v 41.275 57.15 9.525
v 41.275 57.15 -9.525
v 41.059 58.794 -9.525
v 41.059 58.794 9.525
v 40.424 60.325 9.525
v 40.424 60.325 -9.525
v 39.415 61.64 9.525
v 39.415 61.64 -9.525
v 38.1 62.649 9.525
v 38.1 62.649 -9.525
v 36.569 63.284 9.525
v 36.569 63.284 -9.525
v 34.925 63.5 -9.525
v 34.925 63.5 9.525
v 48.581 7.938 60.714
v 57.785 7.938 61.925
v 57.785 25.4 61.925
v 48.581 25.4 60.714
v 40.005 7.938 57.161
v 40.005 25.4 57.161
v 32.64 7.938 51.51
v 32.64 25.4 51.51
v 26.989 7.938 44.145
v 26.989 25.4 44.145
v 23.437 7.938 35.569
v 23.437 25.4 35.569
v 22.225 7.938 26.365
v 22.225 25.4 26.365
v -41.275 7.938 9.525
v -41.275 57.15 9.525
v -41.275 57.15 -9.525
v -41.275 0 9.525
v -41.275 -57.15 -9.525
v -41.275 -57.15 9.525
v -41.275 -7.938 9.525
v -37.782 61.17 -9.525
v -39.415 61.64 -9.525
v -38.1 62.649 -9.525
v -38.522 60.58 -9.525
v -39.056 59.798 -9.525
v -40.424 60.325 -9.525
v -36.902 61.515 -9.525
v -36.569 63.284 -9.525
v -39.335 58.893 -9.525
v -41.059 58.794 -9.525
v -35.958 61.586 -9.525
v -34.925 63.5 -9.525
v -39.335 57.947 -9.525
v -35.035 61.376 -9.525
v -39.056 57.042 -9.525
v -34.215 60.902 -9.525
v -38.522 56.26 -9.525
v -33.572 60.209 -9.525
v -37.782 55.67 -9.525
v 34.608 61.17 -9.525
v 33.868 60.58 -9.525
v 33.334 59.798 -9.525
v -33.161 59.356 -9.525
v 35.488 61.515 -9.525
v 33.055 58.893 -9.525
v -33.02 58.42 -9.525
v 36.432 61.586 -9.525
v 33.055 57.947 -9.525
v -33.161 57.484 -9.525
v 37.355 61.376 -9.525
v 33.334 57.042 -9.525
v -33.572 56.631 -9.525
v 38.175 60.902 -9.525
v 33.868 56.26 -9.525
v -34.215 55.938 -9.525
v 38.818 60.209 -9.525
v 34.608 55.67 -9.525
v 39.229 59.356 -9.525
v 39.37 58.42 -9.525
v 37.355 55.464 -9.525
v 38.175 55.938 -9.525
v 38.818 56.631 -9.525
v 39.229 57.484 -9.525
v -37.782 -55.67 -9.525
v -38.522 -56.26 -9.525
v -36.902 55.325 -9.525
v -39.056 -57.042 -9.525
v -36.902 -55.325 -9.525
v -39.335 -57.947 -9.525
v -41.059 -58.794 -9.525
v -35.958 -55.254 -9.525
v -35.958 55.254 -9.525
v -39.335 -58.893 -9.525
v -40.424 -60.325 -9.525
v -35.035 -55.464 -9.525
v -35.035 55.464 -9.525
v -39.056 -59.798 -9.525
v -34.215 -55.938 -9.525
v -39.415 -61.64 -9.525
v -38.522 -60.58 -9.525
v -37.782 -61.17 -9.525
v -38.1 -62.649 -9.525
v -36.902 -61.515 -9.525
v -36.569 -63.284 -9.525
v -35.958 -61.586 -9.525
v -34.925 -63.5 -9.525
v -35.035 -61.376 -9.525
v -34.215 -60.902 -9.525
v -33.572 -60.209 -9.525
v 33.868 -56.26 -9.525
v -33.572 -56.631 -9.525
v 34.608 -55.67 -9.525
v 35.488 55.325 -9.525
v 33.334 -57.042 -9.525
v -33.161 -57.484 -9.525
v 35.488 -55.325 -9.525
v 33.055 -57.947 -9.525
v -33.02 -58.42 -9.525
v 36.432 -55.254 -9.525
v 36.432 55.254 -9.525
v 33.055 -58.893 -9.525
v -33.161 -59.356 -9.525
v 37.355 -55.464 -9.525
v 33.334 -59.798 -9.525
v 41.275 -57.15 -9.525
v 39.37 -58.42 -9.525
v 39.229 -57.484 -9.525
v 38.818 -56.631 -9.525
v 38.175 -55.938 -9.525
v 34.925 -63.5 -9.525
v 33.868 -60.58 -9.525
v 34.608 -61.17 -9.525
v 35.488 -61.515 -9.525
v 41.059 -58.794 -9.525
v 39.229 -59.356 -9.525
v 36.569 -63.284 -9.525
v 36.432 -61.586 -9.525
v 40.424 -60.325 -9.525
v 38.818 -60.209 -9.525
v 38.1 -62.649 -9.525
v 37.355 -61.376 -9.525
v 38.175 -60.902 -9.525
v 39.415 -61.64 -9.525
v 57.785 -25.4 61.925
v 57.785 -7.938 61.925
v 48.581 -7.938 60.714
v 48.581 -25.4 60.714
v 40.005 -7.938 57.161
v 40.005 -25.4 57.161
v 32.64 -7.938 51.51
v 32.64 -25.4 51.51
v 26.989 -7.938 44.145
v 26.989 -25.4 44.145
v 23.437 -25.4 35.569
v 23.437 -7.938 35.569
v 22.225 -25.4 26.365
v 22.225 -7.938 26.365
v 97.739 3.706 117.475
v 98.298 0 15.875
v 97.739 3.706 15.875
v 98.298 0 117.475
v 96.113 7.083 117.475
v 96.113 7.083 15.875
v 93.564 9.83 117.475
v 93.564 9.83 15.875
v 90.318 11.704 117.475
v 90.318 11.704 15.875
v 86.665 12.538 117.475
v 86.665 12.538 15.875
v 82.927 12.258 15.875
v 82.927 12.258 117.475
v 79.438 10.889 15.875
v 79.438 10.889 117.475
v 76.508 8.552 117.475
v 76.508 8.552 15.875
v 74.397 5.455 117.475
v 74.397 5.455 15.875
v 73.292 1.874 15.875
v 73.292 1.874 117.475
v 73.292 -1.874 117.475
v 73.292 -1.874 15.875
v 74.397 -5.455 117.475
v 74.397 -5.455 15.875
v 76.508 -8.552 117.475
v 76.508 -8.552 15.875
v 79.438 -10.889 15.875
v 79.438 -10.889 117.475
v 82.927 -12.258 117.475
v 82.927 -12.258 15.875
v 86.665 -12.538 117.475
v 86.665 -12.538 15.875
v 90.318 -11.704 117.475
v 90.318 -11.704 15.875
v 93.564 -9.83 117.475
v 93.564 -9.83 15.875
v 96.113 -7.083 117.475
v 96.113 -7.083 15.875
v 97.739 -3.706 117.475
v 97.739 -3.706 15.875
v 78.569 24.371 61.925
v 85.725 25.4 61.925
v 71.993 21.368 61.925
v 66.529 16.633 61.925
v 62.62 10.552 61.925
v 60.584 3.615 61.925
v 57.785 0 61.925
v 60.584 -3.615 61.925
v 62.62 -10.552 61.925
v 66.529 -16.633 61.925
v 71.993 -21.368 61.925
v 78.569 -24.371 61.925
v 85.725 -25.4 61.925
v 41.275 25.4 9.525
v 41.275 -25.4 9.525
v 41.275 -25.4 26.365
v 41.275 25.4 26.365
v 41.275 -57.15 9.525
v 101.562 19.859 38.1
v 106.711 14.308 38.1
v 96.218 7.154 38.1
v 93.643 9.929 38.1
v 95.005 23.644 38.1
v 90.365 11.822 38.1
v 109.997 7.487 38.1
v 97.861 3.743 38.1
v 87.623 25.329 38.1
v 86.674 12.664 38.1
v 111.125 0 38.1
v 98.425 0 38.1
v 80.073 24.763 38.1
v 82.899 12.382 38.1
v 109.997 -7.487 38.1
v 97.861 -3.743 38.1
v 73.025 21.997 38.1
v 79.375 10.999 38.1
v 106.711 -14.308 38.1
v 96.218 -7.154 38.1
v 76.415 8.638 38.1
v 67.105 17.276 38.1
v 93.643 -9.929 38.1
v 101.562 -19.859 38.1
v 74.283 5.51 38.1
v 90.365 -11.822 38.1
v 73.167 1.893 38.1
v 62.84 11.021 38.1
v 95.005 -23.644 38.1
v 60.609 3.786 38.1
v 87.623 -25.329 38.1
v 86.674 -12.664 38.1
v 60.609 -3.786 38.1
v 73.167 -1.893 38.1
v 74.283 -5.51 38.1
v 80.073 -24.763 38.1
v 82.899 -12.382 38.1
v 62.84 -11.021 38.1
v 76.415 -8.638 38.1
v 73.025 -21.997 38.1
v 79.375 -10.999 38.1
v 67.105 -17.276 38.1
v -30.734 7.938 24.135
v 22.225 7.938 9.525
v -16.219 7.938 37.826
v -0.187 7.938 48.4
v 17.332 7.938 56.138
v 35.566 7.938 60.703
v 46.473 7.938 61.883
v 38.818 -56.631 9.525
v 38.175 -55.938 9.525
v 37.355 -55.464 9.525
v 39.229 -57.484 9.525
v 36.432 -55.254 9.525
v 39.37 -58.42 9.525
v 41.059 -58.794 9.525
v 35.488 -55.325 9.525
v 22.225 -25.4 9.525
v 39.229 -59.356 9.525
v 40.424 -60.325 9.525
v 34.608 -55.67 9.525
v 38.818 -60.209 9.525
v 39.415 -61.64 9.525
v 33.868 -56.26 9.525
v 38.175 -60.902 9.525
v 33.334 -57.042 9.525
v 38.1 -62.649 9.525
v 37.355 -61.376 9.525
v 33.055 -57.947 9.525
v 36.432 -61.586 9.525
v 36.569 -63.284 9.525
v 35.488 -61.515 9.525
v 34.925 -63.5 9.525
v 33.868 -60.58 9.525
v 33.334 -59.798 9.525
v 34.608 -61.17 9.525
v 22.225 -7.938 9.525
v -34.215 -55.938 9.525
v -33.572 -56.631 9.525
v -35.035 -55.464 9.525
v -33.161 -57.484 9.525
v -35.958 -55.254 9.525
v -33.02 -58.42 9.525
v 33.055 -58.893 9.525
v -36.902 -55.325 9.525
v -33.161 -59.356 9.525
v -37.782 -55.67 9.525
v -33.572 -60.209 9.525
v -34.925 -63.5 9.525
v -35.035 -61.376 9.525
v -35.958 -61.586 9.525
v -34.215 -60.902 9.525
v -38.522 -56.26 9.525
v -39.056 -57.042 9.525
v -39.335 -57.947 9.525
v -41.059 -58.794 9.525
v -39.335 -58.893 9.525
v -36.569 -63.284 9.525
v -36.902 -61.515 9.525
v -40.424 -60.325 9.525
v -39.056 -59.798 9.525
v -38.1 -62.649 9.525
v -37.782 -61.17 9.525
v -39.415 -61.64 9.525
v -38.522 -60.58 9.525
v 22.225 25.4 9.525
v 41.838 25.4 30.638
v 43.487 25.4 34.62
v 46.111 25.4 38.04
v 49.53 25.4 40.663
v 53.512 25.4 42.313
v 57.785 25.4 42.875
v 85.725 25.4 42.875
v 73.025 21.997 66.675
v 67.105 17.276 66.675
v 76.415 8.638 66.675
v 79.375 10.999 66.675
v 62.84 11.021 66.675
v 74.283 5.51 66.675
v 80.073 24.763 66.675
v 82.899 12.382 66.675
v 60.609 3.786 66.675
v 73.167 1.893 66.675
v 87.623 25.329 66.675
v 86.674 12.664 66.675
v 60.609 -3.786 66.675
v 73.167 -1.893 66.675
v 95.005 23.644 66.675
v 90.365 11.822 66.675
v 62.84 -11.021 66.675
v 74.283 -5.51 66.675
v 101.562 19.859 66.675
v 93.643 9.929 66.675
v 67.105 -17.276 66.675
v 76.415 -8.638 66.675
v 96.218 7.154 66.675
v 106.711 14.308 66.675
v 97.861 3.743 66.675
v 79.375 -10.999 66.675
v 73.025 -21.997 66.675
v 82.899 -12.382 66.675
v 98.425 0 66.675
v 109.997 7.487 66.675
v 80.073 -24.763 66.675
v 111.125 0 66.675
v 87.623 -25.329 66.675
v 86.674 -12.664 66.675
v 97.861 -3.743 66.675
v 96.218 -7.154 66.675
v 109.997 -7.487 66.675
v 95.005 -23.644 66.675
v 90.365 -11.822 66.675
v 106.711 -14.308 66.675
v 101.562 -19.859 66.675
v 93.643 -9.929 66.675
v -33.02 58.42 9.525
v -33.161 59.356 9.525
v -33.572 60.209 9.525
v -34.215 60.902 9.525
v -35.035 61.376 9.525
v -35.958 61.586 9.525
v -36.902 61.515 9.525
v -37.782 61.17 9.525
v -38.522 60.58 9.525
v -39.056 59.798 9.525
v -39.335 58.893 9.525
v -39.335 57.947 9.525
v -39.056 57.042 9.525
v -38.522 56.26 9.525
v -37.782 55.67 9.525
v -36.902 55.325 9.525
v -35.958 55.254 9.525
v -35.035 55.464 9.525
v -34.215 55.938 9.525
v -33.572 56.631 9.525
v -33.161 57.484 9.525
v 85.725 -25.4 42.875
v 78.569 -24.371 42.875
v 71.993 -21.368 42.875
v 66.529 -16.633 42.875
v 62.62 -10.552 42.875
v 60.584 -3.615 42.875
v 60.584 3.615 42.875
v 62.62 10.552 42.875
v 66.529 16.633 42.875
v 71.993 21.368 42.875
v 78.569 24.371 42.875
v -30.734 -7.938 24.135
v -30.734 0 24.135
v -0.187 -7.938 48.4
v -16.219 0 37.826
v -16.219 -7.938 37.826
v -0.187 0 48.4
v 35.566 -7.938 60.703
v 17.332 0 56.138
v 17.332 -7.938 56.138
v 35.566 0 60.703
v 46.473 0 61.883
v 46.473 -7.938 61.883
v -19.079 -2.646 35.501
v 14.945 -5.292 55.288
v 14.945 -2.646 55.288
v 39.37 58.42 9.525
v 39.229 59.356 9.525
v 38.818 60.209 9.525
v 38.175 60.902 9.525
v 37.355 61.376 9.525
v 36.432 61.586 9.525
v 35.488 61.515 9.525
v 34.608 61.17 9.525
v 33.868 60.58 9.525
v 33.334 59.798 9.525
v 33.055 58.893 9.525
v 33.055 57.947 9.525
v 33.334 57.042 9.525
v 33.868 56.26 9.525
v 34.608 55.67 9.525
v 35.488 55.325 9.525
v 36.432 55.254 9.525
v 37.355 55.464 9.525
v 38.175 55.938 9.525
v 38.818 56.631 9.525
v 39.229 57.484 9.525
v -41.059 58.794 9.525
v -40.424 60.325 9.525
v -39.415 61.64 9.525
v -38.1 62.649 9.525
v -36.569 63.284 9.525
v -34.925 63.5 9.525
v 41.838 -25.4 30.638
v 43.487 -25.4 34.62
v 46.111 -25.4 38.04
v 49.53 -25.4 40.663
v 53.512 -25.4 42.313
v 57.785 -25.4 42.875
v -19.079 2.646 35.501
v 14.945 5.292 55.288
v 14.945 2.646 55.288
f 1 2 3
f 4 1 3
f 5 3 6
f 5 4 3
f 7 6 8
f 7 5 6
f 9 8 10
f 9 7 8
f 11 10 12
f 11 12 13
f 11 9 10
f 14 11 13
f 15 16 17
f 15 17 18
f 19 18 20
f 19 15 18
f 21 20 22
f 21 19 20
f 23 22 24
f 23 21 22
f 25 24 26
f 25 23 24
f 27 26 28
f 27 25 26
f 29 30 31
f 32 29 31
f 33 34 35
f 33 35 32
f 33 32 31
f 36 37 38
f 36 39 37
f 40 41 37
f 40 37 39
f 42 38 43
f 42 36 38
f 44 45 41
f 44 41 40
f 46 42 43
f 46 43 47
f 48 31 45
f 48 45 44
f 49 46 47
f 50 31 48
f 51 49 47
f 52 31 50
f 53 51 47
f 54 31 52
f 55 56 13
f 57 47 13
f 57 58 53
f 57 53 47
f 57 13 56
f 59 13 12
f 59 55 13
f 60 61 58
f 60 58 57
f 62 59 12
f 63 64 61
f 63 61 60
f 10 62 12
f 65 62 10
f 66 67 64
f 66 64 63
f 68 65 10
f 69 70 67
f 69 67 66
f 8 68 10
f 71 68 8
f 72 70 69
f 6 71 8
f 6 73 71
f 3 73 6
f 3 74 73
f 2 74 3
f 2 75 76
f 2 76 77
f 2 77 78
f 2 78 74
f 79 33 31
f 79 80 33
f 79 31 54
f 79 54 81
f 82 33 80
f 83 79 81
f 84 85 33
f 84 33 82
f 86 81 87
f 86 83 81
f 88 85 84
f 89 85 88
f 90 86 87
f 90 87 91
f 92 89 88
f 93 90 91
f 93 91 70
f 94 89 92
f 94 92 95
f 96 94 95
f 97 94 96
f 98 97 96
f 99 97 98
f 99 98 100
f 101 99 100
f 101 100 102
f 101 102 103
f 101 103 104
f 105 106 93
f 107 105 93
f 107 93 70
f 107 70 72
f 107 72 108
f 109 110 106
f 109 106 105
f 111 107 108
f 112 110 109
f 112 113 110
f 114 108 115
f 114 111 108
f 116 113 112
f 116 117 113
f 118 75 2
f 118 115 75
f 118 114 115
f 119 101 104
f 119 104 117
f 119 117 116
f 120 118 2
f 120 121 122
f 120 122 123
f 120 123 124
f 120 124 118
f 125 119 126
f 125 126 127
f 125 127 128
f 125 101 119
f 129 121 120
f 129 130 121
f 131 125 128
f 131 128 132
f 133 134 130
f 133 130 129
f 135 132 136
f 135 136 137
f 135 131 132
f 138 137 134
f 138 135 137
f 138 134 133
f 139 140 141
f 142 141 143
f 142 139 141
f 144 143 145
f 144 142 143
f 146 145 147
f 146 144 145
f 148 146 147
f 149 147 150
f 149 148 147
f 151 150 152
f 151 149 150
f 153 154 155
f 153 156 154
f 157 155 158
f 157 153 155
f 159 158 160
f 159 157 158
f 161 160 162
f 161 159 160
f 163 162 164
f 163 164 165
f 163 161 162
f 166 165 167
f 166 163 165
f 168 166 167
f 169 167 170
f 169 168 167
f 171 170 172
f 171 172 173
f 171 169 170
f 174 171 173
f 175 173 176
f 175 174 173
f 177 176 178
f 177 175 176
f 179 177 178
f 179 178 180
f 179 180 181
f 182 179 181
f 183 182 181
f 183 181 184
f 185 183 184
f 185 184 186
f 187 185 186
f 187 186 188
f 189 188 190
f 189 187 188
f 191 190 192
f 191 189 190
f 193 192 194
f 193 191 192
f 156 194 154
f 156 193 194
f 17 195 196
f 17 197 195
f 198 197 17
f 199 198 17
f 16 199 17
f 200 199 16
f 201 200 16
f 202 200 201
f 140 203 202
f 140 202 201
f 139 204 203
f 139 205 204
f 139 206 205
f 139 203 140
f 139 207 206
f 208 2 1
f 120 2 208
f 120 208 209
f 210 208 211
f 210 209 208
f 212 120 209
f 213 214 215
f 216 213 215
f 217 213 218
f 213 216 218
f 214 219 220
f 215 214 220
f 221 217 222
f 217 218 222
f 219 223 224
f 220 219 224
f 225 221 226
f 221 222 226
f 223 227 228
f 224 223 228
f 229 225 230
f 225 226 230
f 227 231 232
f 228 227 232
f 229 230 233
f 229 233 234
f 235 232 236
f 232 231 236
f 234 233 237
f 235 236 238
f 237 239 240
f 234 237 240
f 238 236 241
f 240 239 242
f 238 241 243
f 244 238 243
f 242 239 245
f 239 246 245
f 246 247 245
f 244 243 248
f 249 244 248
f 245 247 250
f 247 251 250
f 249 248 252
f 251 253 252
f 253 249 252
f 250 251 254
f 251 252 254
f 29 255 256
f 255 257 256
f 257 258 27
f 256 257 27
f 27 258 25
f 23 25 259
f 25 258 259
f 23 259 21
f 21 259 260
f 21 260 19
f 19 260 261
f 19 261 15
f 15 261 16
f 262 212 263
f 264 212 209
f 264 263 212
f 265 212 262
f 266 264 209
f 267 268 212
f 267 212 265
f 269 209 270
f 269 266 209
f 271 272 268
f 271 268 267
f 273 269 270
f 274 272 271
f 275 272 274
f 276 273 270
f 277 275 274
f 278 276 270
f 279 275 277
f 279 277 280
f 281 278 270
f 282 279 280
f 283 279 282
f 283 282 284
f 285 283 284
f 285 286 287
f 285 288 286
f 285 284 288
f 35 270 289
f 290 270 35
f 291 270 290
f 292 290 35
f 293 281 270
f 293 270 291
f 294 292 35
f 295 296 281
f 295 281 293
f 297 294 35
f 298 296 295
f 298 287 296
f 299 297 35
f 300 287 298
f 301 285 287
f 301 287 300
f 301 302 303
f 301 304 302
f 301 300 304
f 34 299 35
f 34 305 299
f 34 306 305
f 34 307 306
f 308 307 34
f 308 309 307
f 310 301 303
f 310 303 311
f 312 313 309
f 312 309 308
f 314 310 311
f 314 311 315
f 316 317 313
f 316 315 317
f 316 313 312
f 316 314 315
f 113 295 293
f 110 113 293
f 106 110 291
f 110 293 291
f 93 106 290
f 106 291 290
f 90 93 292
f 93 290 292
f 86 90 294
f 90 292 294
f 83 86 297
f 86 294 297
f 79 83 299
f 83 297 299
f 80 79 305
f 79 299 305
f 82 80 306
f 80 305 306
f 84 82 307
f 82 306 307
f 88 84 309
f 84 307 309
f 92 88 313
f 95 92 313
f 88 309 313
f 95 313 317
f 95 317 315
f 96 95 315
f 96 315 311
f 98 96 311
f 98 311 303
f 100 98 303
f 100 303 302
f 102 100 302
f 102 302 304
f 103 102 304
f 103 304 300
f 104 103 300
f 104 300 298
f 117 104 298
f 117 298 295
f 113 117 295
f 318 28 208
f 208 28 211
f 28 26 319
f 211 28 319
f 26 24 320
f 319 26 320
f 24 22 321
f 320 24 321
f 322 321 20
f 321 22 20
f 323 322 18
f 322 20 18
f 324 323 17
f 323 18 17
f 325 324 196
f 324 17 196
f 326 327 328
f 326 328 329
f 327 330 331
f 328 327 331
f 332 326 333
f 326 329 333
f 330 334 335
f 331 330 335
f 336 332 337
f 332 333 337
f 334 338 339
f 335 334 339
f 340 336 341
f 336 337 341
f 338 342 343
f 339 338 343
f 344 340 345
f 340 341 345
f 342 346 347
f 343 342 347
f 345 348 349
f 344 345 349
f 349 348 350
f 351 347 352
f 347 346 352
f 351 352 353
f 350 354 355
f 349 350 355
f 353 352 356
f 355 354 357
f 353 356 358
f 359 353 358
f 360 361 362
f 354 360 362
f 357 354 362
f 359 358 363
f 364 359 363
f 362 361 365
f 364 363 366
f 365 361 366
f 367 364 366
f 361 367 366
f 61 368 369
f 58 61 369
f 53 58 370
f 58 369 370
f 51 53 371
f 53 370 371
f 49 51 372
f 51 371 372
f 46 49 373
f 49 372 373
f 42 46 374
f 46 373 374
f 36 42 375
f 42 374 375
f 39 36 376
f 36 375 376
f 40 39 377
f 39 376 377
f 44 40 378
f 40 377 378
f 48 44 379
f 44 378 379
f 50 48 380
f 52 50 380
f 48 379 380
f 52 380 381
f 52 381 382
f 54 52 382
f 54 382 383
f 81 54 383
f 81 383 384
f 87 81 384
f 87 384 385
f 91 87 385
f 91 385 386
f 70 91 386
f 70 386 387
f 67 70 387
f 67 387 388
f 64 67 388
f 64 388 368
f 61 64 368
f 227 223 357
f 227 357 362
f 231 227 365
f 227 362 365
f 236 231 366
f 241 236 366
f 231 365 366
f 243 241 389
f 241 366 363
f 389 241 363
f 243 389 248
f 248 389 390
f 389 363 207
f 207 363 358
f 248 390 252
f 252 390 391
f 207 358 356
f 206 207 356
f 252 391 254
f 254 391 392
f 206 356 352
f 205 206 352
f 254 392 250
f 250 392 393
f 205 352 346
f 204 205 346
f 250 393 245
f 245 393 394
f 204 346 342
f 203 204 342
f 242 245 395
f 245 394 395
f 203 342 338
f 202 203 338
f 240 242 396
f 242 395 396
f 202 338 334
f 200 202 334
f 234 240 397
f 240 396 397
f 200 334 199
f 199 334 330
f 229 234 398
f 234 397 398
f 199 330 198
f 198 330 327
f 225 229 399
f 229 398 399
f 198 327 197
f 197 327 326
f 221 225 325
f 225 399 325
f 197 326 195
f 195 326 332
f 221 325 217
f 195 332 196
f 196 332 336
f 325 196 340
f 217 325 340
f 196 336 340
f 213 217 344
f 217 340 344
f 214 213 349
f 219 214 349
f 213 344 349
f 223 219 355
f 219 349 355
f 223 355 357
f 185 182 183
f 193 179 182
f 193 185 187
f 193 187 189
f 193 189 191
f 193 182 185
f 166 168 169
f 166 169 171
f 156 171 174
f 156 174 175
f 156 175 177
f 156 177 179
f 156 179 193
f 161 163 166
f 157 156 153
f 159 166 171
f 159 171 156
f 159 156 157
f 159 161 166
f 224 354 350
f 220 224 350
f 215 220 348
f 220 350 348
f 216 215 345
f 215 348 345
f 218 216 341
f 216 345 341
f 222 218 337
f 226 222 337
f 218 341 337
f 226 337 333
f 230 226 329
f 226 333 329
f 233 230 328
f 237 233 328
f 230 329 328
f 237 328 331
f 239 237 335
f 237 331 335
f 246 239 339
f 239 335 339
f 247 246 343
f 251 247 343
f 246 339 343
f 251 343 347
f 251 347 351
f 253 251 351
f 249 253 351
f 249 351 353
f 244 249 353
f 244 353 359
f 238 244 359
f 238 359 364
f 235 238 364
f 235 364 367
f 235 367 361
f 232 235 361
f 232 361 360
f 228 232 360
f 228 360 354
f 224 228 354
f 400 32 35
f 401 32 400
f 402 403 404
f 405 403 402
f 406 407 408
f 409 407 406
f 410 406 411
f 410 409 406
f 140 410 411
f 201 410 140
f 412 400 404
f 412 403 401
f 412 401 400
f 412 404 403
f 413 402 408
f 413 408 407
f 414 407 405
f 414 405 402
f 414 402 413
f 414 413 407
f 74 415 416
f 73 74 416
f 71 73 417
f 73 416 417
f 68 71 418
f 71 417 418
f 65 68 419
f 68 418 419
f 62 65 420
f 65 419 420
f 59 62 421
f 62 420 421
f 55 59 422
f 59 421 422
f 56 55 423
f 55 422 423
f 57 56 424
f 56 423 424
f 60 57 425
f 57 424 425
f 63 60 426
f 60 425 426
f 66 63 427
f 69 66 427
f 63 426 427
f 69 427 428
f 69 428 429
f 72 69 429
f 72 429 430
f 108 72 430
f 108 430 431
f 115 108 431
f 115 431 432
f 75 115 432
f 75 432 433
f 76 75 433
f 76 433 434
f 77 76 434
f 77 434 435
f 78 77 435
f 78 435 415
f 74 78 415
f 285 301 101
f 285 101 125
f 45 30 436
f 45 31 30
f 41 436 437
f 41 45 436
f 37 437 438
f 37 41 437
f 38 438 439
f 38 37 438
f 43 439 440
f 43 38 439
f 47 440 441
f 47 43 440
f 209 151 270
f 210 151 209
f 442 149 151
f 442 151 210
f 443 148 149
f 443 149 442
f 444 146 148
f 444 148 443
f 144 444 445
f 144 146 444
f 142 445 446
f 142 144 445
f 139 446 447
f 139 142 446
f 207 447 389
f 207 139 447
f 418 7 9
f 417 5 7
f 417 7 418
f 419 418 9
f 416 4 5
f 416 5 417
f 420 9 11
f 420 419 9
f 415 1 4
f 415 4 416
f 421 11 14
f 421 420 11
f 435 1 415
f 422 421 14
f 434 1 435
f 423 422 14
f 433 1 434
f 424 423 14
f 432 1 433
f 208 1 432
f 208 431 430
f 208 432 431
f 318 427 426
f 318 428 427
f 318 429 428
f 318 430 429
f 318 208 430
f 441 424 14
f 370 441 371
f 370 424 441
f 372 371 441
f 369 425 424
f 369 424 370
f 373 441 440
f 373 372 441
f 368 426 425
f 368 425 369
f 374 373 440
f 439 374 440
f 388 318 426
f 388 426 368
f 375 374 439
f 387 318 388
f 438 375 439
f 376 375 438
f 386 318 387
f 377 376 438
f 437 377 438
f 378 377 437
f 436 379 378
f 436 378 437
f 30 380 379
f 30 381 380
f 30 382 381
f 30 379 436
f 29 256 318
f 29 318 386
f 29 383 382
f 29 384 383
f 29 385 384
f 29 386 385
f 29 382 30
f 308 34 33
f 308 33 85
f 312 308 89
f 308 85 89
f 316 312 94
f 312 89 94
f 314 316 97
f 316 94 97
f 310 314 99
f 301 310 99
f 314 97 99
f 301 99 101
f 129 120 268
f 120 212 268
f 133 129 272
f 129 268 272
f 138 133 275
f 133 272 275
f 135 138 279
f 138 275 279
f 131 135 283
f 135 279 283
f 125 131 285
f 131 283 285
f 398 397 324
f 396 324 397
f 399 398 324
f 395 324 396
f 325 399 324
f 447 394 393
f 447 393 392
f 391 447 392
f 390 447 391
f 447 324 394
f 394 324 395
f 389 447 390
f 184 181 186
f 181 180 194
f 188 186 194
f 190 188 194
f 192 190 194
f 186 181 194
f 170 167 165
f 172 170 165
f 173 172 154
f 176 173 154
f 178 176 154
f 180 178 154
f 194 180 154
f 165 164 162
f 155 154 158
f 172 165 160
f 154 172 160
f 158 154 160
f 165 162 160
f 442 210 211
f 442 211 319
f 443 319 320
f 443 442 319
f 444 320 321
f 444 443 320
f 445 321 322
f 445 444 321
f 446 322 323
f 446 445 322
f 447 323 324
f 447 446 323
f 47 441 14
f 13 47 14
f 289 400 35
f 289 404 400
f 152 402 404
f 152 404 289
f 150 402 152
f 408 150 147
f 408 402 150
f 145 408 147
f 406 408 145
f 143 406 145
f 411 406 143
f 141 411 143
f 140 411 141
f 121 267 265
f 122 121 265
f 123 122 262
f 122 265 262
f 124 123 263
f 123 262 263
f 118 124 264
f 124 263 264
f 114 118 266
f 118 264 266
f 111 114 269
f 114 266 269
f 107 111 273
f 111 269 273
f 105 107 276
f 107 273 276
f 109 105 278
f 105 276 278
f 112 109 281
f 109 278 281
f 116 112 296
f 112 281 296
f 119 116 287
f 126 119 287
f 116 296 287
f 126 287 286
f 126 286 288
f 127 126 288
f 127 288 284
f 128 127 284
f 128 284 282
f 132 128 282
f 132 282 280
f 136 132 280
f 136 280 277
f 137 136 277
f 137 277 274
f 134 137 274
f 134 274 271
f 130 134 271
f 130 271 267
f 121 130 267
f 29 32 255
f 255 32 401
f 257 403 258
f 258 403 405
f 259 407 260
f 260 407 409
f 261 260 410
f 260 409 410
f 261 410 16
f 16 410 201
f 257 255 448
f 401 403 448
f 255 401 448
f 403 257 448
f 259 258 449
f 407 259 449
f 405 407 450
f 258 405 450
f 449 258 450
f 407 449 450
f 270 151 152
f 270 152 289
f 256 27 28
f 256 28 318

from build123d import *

# Parameters (mm, degrees)
F1_DEPTH  = 63.5
F0_W      = 25.4
F0_H      = 19.05
F2_DEPTH  = 25.4
F3_DEPTH  = 7.9375
F5_R      = 6.35
F6_R      = 12.7
F7_DEPTH  = 30.48
F8_R      = 3.175
F9_DEPTH  = 25.4
F10_R     = 12.573
F11_DEPTH = 50.8


with BuildPart() as f1:
    # F0 (on Front) → F1 (new body, symmetric)
    with BuildSketch(Plane.XZ):
        Polygon((41.275, -9.525), (41.275, 9.525), (22.225, 9.525), (-41.275, 9.525), (-41.275, -9.525), align=None)
    extrude(amount=F1_DEPTH, both=True)

    # F0 (on Front) → F2 (join, symmetric)
    with BuildSketch(Plane.XZ):
        with BuildLine():
            Line((22.225, 9.525), (41.275, 9.525))
            Line((41.275, 9.525), (41.275, 26.3652))
            ThreePointArc((41.275, 26.3652), (46.1106670426, 38.0395329574), (57.785, 42.8752))
            Line((57.785, 42.8752), (60.325, 42.8752))
            Line((60.325, 42.8752), (60.325, 61.9252))
            Line((60.325, 61.9252), (57.785, 61.9252))
            ThreePointArc((57.785, 61.9252), (32.640282861, 51.509917139), (22.225, 26.3652))
            Line((22.225, 26.3652), (22.225, 9.525))
        make_face()
        with Locations((73.025, 52.4002)):
            Rectangle(F0_W, F0_H)
    extrude(amount=F2_DEPTH, both=True)

    # F0 (on Front) → F3 (join, symmetric)
    with BuildSketch(Plane.XZ):
        with BuildLine():
            Line((-41.275, 9.525), (22.225, 9.525))
            Line((22.225, 9.525), (22.225, 26.3652))
            ThreePointArc((22.225, 26.3652), (32.640282861, 51.509917139), (57.785, 61.9252))
            add(Edge.make_bspline(
                [(-41.275, 9.525), (-25.9972773492, 36.2750738859), (11.5414904431, 64.1821846366), (57.785, 61.9252)],
                knots=[0, 0, 0, 0, 112.0654476636, 112.0654476636, 112.0654476636, 112.0654476636], degree=3))
        make_face()
    extrude(amount=F3_DEPTH, both=True)

    # F0 (on Front) → F4 (revolve)
    with BuildSketch(Plane.XZ):
        Polygon((85.725, 61.9252), (85.725, 42.8752), (85.725, 38.1), (111.125, 38.1), (111.125, 66.675), (85.725, 66.675), align=None)
    revolve(axis=Axis((85.725, 0, 52.3875), (0, 0, -1)))

    # F5
    f5_edges = [f1.edges().sort_by_distance(p)[0] for p in [
        (-41.275, -63.5, 0),
        (41.275, -63.5, 0),
        (41.275, 63.5, 0),
        (-41.275, 63.5, 0),
    ]]
    fillet(f5_edges, radius=F5_R)

    # F6 (on face) → F7 (cut)
    with BuildSketch(Plane.XY.offset(66.675)):
        with Locations((85.725, 0)):
            Circle(F6_R)
    extrude(amount=-F7_DEPTH, mode=Mode.SUBTRACT)

    # F8 (on face) → F9 (cut)
    with BuildSketch(Plane.XY.offset(9.525)):
        with Locations((-36.195, 58.42)):
            Circle(F8_R)
        with Locations((36.195, 58.42)):
            Circle(F8_R)
        with Locations((36.195, -58.42)):
            Circle(F8_R)
        with Locations((-36.195, -58.42)):
            Circle(F8_R)
    extrude(amount=-F9_DEPTH, mode=Mode.SUBTRACT)


with BuildPart() as f11:
    # F10 (on face) → F11 (new body, symmetric)
    with BuildSketch(Plane.XY.offset(66.675)):
        with Locations((85.725, 0)):
            Circle(F10_R)
    extrude(amount=F11_DEPTH, both=True)


solid = Compound([f1.part, f11.part])
